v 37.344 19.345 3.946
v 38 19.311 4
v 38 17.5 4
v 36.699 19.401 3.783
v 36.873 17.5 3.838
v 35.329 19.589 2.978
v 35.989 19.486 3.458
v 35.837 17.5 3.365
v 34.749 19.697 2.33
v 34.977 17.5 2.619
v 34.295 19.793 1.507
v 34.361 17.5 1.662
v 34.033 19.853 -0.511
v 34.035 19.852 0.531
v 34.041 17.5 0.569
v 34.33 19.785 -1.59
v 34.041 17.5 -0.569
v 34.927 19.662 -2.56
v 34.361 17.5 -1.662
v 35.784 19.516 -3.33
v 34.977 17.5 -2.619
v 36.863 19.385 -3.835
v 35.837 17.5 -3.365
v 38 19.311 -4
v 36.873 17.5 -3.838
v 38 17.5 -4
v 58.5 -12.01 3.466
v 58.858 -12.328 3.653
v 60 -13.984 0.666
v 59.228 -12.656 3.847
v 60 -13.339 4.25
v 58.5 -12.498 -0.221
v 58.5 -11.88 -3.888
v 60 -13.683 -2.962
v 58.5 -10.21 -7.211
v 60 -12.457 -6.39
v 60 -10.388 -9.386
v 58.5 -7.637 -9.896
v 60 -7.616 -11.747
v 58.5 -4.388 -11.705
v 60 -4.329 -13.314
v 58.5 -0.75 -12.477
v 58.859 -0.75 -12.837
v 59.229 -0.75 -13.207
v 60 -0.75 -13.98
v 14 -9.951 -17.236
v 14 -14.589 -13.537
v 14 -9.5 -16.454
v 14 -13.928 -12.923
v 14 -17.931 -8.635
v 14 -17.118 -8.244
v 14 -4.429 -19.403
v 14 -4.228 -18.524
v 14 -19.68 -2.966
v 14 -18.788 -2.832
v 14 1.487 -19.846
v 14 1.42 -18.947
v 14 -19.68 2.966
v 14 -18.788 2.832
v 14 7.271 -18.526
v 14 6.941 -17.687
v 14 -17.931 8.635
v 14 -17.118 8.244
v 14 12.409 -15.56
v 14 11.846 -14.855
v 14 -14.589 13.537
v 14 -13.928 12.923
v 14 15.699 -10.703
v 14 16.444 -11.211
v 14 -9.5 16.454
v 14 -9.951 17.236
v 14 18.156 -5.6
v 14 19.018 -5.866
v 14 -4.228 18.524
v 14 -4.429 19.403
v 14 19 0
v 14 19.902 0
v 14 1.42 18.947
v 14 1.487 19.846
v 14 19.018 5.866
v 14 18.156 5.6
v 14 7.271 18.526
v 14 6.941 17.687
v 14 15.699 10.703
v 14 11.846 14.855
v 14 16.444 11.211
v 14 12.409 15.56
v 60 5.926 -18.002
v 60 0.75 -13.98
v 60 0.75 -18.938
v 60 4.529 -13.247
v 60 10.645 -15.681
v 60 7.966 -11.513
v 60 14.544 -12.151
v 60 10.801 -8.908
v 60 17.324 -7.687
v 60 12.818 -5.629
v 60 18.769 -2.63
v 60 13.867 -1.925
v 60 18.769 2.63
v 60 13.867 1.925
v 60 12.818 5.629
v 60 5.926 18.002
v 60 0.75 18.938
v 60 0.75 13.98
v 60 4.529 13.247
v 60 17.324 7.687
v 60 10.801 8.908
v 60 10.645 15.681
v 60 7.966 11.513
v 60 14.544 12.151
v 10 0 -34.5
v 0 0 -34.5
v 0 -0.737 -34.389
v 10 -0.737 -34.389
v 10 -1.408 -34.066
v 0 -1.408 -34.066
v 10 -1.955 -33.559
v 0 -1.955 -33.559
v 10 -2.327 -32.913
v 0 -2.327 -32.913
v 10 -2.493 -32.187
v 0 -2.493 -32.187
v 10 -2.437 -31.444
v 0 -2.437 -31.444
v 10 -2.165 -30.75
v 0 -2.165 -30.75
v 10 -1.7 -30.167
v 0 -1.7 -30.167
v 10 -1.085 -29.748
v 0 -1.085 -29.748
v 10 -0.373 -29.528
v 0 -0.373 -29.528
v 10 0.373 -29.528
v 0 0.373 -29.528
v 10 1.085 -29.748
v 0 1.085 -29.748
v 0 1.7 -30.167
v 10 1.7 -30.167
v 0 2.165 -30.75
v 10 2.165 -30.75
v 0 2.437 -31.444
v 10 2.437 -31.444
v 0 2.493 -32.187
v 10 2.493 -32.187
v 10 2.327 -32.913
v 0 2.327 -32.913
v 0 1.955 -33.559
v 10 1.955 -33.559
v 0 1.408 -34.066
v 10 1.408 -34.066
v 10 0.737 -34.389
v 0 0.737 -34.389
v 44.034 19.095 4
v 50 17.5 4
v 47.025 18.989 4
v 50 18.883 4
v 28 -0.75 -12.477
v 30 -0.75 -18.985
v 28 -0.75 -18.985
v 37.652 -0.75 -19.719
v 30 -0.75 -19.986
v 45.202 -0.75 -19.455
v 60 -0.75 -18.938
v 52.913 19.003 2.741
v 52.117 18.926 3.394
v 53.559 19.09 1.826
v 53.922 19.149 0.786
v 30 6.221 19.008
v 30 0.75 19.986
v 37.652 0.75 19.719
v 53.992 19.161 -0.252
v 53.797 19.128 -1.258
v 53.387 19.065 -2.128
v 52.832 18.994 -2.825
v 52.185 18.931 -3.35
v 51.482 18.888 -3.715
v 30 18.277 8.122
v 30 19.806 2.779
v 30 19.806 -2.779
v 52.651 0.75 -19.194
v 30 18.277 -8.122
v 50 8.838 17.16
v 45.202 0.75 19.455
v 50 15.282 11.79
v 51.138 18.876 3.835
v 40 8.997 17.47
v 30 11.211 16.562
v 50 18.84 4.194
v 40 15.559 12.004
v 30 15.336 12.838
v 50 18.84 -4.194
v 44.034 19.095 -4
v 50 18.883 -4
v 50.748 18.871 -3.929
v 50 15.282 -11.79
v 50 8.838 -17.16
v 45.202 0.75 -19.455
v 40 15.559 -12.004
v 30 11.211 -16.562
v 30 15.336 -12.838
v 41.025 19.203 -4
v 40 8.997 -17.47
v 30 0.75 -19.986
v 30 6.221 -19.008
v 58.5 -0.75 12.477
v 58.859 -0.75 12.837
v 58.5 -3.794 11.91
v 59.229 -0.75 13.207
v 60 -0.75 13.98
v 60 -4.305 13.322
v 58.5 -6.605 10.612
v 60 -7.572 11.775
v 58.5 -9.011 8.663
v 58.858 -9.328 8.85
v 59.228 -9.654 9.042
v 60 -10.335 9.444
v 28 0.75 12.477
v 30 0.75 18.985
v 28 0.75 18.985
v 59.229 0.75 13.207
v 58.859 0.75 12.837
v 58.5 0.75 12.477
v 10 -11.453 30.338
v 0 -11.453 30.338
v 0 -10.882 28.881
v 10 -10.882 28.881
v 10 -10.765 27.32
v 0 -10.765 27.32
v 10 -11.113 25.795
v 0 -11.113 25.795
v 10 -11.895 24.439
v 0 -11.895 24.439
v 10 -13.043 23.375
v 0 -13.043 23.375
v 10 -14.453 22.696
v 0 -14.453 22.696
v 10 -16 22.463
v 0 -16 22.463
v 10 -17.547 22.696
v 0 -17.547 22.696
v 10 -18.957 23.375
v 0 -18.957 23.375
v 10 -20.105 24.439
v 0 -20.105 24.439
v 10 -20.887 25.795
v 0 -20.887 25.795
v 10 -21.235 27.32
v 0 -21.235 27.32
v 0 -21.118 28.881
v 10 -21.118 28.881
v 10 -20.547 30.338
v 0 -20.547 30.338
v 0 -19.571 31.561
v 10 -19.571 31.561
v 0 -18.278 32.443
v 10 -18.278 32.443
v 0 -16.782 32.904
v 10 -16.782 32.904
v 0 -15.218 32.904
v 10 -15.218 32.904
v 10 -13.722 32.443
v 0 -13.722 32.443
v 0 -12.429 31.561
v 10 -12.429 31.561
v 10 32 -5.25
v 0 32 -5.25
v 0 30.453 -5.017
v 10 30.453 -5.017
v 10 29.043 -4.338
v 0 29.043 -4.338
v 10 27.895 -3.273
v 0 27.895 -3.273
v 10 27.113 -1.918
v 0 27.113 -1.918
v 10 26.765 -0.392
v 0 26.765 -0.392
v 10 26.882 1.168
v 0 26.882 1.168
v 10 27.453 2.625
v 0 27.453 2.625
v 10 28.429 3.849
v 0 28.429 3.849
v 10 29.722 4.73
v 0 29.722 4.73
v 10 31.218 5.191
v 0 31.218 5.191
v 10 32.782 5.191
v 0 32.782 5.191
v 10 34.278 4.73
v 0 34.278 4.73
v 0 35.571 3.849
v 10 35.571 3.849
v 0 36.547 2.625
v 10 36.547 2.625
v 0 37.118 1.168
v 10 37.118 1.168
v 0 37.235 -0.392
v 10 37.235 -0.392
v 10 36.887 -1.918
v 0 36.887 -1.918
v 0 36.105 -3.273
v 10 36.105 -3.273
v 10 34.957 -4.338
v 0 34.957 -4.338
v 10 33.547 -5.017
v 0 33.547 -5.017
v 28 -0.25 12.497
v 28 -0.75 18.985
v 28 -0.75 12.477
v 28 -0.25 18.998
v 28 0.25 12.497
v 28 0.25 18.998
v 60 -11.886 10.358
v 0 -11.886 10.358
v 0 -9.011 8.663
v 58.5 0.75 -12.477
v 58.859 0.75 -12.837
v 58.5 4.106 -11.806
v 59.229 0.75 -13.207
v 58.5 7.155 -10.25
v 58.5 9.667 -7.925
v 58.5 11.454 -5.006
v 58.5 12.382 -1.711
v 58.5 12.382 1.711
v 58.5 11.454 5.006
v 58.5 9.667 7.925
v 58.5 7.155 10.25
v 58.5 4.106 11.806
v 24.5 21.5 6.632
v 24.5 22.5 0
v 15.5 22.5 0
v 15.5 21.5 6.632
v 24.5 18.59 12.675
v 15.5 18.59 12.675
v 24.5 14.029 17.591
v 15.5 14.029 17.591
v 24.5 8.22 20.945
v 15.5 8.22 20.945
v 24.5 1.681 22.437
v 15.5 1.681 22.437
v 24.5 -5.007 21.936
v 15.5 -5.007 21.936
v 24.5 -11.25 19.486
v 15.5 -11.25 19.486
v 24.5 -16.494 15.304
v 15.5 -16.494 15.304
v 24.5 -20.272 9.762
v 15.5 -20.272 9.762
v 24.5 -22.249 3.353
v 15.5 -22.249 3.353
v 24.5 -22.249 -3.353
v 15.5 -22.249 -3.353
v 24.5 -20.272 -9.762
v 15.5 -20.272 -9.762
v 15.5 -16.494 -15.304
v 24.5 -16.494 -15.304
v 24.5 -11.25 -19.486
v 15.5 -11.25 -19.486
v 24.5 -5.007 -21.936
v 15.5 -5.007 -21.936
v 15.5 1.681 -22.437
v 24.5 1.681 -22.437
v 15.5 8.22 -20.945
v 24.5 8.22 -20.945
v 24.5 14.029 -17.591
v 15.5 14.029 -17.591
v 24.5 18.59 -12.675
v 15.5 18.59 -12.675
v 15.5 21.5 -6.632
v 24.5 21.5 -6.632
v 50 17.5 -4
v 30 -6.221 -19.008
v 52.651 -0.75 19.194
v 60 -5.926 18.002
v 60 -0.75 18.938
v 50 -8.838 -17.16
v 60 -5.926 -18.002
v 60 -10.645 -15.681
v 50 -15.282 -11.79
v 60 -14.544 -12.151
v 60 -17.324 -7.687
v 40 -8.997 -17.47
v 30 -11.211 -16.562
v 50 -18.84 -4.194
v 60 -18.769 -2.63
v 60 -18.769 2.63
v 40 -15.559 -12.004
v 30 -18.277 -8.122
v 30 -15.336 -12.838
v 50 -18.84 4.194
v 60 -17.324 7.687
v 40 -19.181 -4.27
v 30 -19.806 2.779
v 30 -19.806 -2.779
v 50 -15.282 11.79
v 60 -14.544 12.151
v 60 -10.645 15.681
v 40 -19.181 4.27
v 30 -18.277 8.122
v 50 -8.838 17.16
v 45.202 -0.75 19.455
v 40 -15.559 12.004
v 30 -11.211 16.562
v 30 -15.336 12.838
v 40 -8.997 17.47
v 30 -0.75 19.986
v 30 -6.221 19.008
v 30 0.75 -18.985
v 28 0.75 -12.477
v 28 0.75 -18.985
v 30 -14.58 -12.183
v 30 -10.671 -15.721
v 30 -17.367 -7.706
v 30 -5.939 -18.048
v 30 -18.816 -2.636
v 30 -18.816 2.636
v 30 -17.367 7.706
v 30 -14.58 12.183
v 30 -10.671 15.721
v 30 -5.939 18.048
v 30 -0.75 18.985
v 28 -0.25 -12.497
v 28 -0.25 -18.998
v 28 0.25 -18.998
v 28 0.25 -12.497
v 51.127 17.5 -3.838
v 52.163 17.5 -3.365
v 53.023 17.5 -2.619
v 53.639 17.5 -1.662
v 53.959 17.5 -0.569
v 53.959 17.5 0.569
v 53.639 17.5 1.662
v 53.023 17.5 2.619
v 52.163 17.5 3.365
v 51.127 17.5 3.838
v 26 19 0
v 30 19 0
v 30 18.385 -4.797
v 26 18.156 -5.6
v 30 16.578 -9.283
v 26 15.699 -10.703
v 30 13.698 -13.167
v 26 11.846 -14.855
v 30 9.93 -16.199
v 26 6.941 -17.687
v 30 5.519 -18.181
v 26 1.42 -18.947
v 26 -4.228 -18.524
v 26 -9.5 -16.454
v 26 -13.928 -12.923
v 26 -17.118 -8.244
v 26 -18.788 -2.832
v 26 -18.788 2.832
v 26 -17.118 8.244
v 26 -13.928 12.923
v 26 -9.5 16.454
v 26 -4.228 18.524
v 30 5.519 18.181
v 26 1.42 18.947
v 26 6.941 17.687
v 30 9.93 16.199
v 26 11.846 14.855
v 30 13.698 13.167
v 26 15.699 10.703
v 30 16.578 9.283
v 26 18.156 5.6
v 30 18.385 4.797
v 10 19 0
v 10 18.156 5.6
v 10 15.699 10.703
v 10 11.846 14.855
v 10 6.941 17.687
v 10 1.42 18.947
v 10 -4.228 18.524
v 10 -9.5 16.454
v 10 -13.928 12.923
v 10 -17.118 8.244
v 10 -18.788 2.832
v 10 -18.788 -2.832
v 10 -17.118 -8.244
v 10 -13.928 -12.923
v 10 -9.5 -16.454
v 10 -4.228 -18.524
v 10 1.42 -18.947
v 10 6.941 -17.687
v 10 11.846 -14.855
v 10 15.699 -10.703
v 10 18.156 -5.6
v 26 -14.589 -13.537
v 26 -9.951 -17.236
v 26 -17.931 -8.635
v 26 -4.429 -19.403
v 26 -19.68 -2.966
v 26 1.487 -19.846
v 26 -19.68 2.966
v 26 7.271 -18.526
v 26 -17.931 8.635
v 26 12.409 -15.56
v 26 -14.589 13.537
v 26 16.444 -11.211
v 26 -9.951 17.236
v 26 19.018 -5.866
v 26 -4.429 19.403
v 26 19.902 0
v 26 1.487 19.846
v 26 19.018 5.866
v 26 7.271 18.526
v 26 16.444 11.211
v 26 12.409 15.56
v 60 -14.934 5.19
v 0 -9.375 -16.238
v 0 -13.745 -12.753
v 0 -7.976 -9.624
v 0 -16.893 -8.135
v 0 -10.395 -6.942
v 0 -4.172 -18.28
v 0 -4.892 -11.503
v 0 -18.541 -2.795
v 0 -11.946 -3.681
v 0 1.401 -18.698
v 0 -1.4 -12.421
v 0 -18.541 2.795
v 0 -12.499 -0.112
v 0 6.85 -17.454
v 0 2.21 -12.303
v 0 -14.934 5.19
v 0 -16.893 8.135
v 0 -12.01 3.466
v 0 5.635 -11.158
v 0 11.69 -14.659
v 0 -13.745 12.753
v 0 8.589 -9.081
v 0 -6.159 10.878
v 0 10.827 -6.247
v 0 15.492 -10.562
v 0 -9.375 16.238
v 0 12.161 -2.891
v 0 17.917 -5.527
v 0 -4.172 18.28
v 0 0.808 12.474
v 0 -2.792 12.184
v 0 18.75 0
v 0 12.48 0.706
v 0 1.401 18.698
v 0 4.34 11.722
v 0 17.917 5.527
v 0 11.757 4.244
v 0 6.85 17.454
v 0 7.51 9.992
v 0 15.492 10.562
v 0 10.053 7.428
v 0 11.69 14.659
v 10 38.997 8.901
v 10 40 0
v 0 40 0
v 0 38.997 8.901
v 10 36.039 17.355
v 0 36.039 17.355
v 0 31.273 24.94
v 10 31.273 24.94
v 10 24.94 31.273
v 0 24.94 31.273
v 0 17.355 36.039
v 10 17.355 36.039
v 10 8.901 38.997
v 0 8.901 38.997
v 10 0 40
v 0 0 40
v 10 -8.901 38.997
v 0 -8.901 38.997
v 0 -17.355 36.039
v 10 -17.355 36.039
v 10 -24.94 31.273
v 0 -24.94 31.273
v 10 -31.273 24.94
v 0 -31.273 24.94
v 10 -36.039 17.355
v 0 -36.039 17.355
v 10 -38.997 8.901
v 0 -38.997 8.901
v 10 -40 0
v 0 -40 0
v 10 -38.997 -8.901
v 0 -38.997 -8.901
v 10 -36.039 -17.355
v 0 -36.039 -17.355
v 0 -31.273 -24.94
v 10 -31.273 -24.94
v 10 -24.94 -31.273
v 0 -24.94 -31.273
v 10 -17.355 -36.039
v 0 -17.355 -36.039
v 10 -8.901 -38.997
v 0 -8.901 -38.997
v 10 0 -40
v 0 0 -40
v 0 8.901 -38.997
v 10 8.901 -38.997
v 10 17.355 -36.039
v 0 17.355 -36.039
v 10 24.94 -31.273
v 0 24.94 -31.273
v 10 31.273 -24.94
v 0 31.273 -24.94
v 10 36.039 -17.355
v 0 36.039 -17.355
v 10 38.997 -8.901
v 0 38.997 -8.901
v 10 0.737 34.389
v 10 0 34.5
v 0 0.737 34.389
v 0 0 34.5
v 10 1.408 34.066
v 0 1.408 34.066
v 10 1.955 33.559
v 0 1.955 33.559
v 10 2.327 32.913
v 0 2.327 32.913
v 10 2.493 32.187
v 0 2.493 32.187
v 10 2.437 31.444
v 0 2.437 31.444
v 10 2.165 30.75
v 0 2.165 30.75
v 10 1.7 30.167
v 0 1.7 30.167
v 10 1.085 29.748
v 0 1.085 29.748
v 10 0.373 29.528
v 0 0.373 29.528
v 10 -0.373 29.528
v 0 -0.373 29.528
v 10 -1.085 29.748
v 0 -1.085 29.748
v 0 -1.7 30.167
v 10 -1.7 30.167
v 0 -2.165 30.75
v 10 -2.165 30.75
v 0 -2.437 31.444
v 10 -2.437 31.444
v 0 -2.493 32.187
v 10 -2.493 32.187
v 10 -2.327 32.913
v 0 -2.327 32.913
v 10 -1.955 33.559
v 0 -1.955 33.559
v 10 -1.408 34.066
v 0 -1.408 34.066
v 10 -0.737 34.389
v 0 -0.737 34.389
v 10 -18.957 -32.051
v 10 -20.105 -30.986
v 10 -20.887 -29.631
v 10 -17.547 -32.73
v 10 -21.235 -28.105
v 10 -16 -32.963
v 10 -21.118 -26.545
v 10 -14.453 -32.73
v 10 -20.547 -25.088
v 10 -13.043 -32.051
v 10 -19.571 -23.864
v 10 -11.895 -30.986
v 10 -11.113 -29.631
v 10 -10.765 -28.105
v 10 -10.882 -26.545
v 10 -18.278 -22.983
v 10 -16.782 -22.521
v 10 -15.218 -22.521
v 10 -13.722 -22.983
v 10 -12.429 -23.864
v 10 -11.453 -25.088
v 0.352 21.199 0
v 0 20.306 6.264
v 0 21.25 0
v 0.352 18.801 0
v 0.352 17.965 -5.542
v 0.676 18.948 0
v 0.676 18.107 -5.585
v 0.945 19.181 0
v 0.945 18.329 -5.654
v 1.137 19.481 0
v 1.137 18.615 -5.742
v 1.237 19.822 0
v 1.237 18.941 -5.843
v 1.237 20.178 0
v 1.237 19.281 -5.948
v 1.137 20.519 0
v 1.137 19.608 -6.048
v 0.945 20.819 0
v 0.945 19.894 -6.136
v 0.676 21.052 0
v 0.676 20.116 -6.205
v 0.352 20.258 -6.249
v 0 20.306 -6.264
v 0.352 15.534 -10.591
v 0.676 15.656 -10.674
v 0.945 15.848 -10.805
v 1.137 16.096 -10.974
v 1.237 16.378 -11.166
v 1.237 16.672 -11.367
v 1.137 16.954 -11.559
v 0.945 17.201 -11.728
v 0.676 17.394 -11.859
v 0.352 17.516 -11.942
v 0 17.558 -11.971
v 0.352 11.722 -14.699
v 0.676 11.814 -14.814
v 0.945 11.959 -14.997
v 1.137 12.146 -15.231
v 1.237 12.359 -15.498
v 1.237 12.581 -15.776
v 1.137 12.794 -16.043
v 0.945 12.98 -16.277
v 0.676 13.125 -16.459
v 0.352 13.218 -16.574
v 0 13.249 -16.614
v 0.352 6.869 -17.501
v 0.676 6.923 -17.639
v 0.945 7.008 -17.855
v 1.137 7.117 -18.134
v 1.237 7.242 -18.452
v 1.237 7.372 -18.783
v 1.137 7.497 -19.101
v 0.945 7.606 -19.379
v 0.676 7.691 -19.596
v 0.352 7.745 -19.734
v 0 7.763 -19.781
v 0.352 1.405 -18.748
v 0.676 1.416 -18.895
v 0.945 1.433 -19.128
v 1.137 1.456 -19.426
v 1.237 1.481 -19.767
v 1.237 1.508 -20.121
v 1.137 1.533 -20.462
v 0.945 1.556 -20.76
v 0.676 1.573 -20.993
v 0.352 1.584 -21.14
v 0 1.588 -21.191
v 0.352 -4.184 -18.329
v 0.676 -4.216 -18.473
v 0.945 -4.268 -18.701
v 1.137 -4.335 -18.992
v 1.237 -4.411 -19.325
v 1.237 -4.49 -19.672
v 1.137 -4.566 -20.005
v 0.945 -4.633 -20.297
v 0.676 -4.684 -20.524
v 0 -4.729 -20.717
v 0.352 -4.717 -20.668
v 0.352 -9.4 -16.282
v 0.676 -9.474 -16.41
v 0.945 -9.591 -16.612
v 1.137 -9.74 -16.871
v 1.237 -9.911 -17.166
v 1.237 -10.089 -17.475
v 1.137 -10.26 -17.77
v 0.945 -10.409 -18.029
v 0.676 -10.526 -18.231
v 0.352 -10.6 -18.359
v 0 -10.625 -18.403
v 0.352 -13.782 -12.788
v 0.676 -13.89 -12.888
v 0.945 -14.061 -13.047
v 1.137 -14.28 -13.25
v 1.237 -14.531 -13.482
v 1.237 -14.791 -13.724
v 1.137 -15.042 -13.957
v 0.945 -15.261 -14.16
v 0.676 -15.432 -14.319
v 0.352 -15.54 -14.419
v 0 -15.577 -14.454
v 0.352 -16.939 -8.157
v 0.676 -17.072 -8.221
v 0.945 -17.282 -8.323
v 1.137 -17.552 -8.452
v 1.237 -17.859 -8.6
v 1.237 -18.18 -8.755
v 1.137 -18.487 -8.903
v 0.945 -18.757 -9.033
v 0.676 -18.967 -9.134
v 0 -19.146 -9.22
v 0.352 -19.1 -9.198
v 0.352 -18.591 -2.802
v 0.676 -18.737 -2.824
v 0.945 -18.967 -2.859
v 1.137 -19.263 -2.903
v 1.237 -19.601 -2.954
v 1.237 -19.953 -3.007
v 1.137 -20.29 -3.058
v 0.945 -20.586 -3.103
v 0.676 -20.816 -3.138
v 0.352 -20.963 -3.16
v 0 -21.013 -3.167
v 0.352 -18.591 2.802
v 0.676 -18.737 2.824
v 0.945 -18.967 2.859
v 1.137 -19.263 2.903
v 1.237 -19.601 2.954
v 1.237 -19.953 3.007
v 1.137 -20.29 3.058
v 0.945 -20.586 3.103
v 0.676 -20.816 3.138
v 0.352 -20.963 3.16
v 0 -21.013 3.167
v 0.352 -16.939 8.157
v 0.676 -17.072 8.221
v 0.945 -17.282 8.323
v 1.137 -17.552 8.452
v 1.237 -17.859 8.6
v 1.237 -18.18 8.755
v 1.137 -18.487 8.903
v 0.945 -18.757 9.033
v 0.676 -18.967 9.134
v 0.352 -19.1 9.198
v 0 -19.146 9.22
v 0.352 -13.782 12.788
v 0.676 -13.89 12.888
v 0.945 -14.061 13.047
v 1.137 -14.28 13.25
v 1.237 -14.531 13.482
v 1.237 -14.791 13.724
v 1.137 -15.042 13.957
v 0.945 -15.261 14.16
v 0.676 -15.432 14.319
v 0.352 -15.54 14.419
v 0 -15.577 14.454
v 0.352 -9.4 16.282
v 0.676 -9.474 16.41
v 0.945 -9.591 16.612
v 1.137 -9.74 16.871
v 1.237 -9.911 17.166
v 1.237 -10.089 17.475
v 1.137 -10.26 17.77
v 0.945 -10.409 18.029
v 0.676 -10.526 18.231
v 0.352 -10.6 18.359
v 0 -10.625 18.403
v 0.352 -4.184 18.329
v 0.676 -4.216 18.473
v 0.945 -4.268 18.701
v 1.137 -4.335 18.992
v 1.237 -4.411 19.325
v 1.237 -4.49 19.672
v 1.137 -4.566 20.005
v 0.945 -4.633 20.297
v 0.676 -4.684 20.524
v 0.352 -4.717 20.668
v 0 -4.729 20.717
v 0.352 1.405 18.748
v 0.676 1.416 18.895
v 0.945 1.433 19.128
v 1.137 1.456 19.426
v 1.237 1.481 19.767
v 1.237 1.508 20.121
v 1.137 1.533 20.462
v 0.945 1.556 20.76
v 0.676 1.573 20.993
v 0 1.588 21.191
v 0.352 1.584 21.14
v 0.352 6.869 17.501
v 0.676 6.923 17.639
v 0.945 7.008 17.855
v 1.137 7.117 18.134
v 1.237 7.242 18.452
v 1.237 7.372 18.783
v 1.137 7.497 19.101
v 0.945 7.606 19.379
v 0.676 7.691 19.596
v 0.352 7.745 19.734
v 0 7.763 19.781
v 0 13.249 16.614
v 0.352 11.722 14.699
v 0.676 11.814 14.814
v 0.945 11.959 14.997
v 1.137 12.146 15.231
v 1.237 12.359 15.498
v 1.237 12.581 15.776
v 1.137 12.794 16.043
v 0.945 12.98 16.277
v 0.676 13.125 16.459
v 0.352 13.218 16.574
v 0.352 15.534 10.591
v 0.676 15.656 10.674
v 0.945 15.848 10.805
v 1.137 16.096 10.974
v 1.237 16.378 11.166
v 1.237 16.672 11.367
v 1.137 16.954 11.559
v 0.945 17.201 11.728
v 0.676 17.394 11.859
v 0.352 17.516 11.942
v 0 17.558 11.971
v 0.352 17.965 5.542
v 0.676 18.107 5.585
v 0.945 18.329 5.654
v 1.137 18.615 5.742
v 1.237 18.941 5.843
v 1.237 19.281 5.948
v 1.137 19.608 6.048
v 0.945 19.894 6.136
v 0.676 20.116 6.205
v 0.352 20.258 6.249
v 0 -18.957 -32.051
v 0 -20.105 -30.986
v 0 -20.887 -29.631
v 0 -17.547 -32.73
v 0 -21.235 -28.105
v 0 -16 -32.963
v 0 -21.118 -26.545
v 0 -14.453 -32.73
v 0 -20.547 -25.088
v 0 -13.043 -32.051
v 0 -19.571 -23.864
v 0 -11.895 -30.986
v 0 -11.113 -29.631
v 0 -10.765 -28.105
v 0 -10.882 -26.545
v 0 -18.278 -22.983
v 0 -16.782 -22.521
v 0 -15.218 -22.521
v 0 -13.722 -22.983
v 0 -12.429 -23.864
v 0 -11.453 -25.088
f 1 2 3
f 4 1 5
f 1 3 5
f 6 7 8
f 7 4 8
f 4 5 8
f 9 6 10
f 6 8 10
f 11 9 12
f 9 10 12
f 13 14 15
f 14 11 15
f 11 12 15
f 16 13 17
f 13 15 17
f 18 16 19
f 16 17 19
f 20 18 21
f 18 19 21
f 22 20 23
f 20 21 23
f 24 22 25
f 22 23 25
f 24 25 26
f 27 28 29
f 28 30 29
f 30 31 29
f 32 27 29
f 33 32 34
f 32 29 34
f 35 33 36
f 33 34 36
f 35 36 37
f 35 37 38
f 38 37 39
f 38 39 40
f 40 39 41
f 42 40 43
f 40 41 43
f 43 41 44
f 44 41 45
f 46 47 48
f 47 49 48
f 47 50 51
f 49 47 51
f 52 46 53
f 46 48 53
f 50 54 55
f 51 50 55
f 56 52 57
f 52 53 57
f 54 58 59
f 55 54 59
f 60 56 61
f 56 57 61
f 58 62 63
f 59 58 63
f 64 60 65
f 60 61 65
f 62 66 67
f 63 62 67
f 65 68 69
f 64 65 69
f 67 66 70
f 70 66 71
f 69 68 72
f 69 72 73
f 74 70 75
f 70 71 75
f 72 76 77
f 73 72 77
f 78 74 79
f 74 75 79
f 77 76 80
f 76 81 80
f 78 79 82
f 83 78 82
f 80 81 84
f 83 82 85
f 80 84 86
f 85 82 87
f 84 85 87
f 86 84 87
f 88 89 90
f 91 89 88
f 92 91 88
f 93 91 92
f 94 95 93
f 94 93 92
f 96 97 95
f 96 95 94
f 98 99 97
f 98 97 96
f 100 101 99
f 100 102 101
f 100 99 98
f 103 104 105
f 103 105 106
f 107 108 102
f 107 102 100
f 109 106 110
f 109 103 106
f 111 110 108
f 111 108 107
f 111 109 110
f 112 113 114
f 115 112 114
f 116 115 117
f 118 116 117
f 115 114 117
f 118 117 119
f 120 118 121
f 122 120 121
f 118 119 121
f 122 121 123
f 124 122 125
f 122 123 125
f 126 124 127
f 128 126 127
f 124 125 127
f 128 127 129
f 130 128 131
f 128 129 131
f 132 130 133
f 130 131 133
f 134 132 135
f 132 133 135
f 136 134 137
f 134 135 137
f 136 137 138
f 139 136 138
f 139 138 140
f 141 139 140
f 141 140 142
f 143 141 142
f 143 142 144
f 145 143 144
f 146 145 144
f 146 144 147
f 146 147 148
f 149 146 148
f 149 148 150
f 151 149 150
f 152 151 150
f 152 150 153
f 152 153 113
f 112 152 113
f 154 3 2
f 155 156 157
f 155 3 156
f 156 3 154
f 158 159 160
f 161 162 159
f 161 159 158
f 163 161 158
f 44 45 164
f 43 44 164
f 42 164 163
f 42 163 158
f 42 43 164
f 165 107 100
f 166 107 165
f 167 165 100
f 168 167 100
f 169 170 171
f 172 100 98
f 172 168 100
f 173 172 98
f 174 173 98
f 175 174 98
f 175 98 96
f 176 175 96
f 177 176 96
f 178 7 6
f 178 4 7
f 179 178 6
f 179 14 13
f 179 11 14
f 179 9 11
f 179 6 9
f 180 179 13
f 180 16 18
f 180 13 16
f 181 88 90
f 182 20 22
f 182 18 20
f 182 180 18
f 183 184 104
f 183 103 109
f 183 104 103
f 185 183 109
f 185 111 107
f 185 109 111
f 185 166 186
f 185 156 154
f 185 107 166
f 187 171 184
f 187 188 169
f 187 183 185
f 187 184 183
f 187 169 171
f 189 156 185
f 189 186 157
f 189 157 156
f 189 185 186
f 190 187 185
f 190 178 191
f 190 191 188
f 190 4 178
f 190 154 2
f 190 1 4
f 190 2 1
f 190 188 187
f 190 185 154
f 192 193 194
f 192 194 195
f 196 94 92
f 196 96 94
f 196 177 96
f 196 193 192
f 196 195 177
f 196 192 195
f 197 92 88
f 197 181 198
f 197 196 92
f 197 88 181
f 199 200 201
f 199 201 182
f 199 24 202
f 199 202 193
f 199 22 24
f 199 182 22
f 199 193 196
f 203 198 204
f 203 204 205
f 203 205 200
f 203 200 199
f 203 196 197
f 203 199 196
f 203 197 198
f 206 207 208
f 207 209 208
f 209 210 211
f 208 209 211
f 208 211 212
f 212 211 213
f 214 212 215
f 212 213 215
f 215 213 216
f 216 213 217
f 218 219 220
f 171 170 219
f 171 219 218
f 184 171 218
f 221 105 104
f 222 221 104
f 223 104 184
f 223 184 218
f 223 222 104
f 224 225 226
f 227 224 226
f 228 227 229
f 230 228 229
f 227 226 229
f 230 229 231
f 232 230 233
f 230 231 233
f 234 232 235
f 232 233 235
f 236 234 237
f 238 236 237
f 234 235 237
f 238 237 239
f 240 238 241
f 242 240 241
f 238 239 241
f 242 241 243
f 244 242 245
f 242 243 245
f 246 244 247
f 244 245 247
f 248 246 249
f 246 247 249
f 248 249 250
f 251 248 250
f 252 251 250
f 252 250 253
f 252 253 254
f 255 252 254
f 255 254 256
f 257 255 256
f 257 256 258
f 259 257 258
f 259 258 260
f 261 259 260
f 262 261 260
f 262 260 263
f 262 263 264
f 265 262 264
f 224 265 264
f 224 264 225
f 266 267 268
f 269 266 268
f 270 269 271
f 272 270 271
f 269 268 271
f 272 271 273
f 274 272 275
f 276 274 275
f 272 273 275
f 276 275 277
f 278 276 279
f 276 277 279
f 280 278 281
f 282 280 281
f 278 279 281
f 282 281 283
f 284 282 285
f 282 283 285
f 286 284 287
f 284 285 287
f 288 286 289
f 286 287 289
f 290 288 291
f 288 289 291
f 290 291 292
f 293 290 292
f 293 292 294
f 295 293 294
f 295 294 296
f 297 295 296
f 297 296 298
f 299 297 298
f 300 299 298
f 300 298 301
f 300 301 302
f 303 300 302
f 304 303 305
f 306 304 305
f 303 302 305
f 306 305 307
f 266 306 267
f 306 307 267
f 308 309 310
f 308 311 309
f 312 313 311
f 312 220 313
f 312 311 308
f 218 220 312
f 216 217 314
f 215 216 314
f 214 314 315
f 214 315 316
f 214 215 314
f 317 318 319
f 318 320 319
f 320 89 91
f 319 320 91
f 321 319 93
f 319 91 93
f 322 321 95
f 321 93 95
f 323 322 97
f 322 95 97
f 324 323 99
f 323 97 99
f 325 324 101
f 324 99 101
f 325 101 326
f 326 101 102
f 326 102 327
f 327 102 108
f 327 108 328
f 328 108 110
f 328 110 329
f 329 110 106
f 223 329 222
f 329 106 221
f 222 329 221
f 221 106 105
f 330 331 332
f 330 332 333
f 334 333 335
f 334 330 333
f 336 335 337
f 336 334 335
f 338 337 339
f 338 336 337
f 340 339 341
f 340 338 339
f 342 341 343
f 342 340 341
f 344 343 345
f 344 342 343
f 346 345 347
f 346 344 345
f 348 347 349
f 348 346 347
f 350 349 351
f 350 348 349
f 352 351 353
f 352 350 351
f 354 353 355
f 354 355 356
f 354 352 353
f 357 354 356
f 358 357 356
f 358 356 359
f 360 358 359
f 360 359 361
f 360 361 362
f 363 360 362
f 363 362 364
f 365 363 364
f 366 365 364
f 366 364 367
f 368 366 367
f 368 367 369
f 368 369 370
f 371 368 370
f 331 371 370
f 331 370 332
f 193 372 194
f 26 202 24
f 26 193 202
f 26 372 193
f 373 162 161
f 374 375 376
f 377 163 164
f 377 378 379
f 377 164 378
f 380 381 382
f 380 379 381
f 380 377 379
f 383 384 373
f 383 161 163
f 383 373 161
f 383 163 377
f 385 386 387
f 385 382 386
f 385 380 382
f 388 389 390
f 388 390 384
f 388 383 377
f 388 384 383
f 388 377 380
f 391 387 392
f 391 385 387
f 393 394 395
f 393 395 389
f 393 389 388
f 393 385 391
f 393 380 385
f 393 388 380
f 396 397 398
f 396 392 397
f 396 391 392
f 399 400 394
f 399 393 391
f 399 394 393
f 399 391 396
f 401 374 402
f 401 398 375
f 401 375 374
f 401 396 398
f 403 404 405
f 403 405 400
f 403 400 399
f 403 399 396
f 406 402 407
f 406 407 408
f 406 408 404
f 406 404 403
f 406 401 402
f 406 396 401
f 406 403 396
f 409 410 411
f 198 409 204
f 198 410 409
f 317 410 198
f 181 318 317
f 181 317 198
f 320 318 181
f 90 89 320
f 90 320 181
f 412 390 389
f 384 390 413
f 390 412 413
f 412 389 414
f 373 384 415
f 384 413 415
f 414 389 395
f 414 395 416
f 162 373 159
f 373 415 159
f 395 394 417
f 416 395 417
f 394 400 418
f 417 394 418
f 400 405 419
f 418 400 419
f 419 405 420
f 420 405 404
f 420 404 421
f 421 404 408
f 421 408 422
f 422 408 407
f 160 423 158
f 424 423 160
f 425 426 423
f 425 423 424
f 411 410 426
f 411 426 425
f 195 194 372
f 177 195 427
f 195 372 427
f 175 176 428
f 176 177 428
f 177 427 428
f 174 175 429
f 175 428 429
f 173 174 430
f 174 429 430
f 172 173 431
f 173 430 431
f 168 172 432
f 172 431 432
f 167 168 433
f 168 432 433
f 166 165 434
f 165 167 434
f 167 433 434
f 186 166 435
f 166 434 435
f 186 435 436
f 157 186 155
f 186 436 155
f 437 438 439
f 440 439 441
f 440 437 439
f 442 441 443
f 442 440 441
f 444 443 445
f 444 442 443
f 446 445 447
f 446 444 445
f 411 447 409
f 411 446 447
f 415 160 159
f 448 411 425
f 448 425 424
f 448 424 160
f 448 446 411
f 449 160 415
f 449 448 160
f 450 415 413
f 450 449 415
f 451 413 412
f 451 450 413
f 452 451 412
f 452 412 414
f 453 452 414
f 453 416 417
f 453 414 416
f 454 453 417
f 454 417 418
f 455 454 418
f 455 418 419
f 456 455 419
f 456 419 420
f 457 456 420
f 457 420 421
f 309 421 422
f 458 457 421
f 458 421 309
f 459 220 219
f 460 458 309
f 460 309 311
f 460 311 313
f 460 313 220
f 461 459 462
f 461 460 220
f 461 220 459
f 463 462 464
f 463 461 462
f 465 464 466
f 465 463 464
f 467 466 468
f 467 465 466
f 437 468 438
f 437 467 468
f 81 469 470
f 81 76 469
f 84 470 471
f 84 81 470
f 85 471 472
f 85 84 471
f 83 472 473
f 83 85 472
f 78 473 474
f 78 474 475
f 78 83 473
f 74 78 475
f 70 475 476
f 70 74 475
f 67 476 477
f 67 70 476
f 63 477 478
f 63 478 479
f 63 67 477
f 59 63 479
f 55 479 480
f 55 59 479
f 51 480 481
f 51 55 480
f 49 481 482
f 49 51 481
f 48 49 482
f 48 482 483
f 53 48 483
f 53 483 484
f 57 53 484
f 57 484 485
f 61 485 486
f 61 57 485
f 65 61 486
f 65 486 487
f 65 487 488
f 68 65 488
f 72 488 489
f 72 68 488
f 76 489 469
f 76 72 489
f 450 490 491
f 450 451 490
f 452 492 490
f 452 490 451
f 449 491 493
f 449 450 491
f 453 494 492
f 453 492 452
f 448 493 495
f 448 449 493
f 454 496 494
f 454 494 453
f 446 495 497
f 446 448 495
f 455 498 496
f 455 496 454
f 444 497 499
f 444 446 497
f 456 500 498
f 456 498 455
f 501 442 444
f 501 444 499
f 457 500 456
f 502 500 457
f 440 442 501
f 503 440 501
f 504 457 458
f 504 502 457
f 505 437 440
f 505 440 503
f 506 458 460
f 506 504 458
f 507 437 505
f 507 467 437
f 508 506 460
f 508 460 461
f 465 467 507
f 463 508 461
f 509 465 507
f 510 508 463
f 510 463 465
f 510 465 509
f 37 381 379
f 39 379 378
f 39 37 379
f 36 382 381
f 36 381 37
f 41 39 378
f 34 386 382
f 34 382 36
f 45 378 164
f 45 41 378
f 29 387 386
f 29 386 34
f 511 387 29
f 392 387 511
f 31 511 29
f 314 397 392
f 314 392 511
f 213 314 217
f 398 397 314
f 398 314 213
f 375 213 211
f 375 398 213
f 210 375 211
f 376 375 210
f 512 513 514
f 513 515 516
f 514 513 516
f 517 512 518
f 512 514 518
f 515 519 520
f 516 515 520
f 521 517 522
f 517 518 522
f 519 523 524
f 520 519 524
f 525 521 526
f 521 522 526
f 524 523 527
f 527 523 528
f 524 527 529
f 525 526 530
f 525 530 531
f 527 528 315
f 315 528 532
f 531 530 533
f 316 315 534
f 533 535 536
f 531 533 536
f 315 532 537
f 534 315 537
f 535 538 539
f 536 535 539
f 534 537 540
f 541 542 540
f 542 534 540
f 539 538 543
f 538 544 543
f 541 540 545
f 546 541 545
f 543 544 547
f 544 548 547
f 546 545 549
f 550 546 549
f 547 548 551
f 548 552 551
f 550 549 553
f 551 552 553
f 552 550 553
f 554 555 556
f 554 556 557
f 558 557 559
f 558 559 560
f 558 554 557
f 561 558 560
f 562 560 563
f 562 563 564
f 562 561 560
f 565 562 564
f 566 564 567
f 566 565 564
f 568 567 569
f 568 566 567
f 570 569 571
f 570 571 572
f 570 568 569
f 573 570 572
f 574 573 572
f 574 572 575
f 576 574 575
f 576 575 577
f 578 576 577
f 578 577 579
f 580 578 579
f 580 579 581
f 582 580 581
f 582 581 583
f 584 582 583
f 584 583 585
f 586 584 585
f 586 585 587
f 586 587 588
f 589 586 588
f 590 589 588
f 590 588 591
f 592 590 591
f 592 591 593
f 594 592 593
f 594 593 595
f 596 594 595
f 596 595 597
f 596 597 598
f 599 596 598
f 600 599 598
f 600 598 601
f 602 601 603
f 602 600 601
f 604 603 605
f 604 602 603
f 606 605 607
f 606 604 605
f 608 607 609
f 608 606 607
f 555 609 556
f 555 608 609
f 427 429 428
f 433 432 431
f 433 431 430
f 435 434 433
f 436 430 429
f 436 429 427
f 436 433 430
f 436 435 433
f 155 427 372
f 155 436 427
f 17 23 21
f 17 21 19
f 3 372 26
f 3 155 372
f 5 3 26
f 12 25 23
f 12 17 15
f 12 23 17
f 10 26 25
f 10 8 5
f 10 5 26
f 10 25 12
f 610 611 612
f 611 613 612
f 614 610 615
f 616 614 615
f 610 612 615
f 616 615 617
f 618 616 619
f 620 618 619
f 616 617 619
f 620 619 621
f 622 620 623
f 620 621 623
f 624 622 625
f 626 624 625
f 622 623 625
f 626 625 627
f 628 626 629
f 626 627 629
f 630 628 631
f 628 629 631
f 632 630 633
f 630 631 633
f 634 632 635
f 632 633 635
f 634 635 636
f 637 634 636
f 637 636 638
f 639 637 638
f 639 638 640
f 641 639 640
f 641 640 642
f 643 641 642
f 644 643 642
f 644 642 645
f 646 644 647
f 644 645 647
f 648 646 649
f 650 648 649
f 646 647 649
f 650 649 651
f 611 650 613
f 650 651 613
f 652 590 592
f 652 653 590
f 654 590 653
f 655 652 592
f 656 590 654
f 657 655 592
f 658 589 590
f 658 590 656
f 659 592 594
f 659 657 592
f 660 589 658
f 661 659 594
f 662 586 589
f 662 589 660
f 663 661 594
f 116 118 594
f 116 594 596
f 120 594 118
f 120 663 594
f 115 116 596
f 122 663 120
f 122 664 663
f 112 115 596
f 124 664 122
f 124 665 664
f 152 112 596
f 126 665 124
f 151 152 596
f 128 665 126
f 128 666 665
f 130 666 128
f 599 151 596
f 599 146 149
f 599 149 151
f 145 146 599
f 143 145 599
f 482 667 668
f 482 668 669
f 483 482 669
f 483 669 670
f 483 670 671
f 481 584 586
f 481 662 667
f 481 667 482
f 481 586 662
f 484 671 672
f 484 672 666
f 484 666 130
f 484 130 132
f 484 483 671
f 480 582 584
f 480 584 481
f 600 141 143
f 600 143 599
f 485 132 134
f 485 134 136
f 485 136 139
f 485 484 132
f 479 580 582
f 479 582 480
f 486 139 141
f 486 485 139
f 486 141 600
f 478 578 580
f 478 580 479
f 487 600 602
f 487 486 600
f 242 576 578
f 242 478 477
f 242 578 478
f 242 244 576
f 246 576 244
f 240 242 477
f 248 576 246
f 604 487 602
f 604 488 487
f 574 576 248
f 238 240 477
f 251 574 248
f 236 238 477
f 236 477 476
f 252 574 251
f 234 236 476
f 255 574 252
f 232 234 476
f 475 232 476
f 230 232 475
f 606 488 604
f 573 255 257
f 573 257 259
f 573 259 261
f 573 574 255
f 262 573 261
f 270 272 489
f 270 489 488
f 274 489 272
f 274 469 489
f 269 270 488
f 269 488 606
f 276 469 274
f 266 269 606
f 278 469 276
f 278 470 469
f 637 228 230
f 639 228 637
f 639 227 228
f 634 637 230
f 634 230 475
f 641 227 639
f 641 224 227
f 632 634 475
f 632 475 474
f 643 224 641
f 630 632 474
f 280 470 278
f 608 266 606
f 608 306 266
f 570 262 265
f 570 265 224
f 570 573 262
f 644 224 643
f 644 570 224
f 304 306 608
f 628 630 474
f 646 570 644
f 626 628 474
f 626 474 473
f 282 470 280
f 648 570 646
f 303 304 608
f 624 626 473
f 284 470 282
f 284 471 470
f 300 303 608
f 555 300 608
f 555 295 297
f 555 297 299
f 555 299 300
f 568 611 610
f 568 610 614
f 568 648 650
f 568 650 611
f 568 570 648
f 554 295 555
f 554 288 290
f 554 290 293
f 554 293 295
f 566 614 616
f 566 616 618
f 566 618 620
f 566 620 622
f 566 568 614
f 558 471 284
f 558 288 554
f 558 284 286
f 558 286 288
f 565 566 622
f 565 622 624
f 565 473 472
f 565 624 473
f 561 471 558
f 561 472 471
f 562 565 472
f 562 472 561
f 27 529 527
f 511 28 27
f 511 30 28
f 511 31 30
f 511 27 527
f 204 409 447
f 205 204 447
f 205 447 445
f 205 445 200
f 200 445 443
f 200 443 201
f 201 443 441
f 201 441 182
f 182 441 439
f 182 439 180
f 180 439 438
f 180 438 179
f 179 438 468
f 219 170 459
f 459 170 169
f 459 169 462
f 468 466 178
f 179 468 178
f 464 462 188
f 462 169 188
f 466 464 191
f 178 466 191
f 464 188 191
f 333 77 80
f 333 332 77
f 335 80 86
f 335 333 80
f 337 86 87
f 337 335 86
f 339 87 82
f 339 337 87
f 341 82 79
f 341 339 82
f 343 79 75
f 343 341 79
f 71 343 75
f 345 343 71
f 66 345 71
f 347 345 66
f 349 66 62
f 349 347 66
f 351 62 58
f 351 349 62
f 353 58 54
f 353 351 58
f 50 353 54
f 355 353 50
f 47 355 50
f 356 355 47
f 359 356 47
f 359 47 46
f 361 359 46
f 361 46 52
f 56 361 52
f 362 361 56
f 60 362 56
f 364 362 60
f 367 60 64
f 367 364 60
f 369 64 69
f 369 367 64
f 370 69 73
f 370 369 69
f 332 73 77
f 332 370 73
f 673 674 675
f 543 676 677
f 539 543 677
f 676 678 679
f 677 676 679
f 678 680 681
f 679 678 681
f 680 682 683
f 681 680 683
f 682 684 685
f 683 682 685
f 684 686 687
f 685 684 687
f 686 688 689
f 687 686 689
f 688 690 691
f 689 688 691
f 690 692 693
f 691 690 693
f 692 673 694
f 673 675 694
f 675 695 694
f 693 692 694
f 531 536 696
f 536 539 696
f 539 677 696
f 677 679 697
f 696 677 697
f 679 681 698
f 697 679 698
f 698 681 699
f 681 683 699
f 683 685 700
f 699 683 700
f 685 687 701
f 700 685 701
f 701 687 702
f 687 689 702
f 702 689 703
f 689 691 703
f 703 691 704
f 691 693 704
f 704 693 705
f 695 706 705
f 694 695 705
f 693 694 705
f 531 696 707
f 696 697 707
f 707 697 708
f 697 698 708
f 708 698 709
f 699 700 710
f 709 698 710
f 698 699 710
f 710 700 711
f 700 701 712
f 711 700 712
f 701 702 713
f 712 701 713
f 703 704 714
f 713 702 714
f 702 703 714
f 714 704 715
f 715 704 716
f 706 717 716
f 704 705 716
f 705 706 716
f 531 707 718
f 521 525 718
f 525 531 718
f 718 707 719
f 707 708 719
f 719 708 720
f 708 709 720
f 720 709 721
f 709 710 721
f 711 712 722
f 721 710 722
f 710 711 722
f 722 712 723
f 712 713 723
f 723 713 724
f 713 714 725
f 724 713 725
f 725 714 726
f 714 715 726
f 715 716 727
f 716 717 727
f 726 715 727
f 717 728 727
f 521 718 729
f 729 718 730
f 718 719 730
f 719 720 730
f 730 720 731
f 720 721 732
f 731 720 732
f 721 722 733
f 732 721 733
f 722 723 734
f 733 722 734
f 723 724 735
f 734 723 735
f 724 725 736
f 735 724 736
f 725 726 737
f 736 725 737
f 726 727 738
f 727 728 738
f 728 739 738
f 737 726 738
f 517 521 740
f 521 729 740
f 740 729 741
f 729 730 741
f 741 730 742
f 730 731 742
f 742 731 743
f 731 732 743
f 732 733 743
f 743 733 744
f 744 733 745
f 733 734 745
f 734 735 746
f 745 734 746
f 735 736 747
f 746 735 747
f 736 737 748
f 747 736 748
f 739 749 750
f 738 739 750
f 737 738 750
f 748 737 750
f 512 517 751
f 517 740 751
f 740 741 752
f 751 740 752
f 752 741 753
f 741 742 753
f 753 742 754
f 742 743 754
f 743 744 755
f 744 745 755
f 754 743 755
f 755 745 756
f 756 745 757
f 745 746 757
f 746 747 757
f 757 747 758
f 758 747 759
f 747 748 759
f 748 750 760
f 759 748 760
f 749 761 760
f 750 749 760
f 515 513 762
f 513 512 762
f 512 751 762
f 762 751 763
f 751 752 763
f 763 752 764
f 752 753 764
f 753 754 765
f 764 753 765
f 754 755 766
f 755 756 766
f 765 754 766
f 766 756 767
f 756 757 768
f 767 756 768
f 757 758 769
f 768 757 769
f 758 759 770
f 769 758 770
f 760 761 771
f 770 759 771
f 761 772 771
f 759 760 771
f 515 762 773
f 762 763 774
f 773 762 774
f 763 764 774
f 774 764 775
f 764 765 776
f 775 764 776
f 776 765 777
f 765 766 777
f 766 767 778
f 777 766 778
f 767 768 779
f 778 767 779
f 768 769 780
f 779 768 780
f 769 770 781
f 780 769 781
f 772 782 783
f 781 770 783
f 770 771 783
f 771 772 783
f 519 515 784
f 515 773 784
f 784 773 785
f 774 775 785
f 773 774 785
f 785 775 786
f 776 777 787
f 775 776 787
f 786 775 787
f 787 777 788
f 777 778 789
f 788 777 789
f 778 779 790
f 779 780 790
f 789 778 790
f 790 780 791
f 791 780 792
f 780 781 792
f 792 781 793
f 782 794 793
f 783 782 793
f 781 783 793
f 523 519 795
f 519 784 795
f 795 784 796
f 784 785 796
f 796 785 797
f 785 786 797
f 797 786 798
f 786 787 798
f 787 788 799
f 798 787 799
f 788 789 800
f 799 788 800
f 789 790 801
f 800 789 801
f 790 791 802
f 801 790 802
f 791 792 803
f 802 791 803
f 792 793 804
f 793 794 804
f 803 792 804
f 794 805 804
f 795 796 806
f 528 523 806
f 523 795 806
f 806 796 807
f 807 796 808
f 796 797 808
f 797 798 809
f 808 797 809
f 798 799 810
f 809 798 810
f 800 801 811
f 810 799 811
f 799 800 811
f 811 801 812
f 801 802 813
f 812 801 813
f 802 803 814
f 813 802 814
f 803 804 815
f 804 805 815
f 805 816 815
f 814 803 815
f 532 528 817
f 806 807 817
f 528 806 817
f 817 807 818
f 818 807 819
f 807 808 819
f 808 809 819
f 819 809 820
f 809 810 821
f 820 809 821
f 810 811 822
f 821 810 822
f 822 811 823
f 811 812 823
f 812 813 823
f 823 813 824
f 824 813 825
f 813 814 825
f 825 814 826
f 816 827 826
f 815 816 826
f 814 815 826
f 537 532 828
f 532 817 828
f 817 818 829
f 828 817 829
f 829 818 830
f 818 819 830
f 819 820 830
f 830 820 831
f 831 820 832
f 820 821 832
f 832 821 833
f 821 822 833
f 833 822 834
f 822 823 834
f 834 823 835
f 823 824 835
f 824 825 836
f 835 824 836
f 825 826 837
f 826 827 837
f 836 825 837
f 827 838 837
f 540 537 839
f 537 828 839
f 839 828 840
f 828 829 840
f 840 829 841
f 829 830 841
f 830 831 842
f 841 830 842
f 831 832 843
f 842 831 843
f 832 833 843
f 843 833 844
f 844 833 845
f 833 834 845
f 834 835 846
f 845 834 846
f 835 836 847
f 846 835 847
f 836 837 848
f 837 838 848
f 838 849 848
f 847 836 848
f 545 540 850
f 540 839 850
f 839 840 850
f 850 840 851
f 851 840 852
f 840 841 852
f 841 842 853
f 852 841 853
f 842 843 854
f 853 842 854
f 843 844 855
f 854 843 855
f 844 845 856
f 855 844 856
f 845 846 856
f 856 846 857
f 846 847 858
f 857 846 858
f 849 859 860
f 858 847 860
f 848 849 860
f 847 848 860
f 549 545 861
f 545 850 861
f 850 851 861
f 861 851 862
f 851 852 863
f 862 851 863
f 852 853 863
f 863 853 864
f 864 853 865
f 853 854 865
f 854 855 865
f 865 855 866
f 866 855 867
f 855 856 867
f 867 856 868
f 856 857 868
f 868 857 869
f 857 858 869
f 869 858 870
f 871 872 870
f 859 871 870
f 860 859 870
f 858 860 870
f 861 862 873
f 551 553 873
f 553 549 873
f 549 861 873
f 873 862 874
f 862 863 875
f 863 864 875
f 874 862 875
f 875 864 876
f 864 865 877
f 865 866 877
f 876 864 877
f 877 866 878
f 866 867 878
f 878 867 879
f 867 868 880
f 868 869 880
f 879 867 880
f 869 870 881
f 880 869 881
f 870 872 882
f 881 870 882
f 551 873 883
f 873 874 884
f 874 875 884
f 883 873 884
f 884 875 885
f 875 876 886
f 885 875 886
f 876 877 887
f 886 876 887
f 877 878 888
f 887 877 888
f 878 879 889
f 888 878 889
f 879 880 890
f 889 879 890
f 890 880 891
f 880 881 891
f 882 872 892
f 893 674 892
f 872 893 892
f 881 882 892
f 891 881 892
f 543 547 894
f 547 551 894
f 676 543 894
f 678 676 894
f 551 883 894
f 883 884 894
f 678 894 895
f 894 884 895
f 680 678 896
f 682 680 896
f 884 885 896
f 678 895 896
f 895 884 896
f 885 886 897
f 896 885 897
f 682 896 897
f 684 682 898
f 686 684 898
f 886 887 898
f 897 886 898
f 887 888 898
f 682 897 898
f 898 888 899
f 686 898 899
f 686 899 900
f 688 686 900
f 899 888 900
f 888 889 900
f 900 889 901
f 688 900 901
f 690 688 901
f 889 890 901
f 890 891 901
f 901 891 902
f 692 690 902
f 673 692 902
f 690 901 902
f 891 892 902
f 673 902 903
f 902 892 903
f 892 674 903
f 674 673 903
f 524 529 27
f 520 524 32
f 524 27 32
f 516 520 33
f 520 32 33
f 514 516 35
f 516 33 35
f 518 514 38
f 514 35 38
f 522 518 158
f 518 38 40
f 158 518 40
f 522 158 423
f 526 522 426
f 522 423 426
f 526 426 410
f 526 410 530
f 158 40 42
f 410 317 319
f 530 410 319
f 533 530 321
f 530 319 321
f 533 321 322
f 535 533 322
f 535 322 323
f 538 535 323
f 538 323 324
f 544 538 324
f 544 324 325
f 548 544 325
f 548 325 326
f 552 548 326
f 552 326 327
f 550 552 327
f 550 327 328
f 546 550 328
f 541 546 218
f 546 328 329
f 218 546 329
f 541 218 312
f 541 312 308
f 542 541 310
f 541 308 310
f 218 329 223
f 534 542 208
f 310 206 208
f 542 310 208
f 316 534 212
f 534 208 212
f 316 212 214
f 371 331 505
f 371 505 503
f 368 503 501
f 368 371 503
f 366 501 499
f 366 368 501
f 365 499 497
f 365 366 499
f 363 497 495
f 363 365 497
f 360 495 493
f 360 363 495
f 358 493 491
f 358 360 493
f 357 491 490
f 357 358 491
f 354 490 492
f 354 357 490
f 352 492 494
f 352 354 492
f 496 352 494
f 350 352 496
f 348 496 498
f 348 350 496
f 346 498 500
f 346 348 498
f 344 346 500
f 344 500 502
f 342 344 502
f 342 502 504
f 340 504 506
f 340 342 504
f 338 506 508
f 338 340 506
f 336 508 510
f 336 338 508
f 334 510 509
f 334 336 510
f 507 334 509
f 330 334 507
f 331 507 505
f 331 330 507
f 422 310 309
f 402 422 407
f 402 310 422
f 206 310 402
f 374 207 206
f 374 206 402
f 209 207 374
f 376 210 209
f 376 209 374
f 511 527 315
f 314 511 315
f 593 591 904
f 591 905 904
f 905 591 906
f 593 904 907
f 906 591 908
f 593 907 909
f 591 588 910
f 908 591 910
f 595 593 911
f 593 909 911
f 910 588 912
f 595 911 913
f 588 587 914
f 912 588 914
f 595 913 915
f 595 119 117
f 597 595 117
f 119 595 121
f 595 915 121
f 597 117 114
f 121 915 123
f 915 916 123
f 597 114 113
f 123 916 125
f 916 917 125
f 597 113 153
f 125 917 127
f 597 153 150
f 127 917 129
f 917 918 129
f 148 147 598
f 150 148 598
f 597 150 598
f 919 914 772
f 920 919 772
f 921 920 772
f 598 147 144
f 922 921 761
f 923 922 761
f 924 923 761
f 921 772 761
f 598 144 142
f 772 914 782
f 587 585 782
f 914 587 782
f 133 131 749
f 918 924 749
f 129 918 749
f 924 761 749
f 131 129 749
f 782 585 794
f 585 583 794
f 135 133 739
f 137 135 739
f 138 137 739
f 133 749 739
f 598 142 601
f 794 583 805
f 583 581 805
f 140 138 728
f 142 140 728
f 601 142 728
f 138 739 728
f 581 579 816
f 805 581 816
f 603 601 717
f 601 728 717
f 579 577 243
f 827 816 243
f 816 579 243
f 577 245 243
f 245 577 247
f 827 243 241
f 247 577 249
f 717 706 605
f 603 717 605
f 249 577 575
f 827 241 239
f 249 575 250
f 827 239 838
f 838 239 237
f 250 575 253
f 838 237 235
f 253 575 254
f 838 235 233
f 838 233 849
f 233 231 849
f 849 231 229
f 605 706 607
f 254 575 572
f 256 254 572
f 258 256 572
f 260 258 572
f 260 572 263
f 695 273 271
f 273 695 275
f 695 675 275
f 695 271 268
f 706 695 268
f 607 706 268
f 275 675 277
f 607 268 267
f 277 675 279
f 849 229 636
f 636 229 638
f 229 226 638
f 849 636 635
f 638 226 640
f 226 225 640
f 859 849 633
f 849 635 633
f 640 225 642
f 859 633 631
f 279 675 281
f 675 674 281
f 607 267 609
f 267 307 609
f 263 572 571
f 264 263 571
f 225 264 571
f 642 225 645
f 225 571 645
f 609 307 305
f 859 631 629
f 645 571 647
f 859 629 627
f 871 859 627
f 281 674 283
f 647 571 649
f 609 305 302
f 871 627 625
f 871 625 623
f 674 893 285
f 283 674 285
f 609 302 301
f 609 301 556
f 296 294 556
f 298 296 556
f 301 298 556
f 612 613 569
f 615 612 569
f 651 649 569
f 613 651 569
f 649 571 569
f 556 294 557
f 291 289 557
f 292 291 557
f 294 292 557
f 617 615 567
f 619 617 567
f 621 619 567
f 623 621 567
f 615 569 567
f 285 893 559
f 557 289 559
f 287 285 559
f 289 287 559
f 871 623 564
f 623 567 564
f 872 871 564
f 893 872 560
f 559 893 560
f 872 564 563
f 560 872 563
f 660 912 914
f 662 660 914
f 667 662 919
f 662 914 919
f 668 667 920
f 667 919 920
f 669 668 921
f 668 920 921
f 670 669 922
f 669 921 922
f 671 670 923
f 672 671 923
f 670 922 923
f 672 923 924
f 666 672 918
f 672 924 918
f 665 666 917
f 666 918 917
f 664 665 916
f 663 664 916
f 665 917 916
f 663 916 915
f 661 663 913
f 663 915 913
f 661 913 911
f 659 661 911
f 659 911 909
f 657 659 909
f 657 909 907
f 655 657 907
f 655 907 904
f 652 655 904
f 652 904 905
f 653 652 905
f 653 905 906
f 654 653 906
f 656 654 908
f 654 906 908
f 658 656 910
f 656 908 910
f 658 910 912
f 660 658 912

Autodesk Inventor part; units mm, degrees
ref_plane "YZ Plane" through (0, 0, 0) normal (1, 0, 0) x (0, 1, 0)
ref_plane "XY Plane" through (0, 0, 0) normal (0, 0, 1) x (1, 0, 0)
sketch "Sketch1" plane through (0, 0, 0) normal (0, 0, 1) x (1, 0, 0)
  line L0 (0, 0) -> (60, 0)
  line L1 (0, 0) -> (0, 12.5) construction
  line L2 (0, 40) -> (10, 40)
  line L3 (10, 40) -> (10, 19)
  line L4 (10, 19) -> (14, 19)
  line L5 (0, 12.5) -> (60, 12.5)
  line L6 (60, 12.5) -> (60, 18.9524)
  line L7 (30, 20) -> (30, 19)
  line L8 (30, 19) -> (26, 19)
  line L9 (26, 19) -> (26, 19.9019)
  line L10 (14, 19.9019) -> (14, 19)
  line L11 (15.5, 22.5) -> (14, 19.9019)
  line L12 (15.5, 22.5) -> (24.5, 22.5)
  line L13 (24.5, 22.5) -> (26, 19.9019)
  line L14 (30, 20) -> (60, 18.9524)
  line L15 (30, 20) -> (60.0183, 20) construction
  arc A0 (0, 18.75) -> (0, 21.25) centre (0, 20) ccw
  line L16 (0, 12.5) -> (0, 18.75)
  line L17 (0, 21.25) -> (0, 40)
  dimension "d0" = 60
  dimension "d1" = 12.5
  dimension "d2" = 27.5
  dimension "d3" = 10
  dimension "d4" = 21
  dimension "d5" = 4
  dimension "d9" = 4
  dimension "d11" = 1
  dimension "d20" = 1.5
  dimension "d21" = 60
  dimension "d22" = 1.5
  dimension "d23" = 60
  dimension "d25" = 0.9019
  dimension "d26" = 0.9019
  dimension "d28" = 60
  dimension "d29" = 2
  dimension "d30" = 7.5
  dimension "d31" = 9
  dimension "d32" = 2.5
  dimension "d33" = 40
revolve "Revolution1" add sketch "Sketch1" angle 360 about axis through (0, 0, 0) along (1, 0, 0)
sketch "Sketch2" plane through (10, 0, 0) normal (1, 0, 0) x (0, 0, -1)
  point P0 (0, 0)
  point P1 (0, 32)
hole "Hole1" at (10, 32, 0) direction (-1, 0, 0) diameter 10.5 end through all
pattern_circular "Circular Pattern1" count 3 over 360 about axis through (30, 0, 0) along (1, 0, 0) of "Hole1"
sketch "Sketch3" plane through (10, 0, 0) normal (1, 0, 0) x (0, 0, -1)
  point P0 (0, 0)
  point P1 (0, 0)
  point P2 (32, 0)
hole "Hole2" at (10, 0, 0) at (10, 0, -32) direction (-1, 0, 0) diameter 5 end through all
pattern_circular "Circular Pattern2" count 2 over 360 about axis through (30, 0, 0) along (1, 0, 0) of "Hole2"
sketch "Sketch4" plane through (60, 0, 0) normal (1, 0, 0) x (0, 0, -1)
  line L0 (-62.0461, 0.75) -> (63.0717, 0.75)
  line L1 (63.0717, 0.75) -> (63.0717, -0.75)
  line L2 (63.0717, -0.75) -> (-62.0461, -0.75)
  line L3 (-62.0461, -0.75) -> (-62.0461, 0.75)
  point P0 (0, 0)
  dimension "d55" = 1.5
  dimension "d56" = 0.75
extrude "Extrusion1" cut sketch "Sketch4" against normal blind 32
sketch "Sketch5" plane through (60, 0, 0) normal (1, 0, 0) x (0, 0, -1)
  line L0 (0, 0) -> (-26.5, -45.8993)
  line L1 (0, 0) -> (53, 0) construction
  line L2 (-2.1416, -9.7648) -> (-5.1902, -14.9339)
  line L3 (-5.1902, -14.9339) -> (-10.3584, -11.8858)
  line L4 (-10.3584, -11.8858) -> (-7.3098, -6.7168)
  line L5 (-7.3098, -6.7168) -> (-2.1416, -9.7648)
  circle A0 centre (0, 0) radius 12.5 projected
  line L6 (-2.1416, -9.7648) -> (-10.3584, -11.8858) construction
  line L7 (-5.1902, -14.9339) -> (-7.3098, -6.7168) construction
  point P0 (-6.25, -10.8253)
  dimension "d59" = 53
  dimension "d60" = 120
  dimension "d61" = 6
  dimension "d62" = 15.5
extrude "Extrusion2" cut sketch "Sketch5" against normal through all contours L5 L2 A0 L0 | L0 A0 L4 L5 | A0 L2 L3 L0 | L0 L3 L4 A0
chamfer "Chamfer1" distance 1.5 angle 45 3 edges at (60, -5.24, 11.3487) (60, 12.5, 0) (60, -10.2103, -7.2111)
thread "Thread1" size "M45x1.5" class "6g" standard "ISO Metric profile" full length
ref_plane "Work Plane1" through (0, 17.5, 0) normal (0, 1, 0) x (-1, 0, 0)
sketch "Sketch6" plane through (0, 17.5, 0) normal (0, 1, 0) x (-1, 0, 0)
  line L0 (-38, 0) -> (-50, 0) construction
  line L1 (-38, 4) -> (-50, 4)
  line L2 (-50, -4) -> (-38, -4)
  arc A0 (-38, -4) -> (-38, 4) centre (-38, 0) ccw
  arc A1 (-50, 4) -> (-50, -4) centre (-50, 0) ccw
  point P0 (0, 0)
  point P1 (-44, 0)
  dimension "d71" = 8
  dimension "d72" = 38
  dimension "d73" = 50
extrude "Extrusion3" cut sketch "Sketch6" along normal blind 26.5
equation "\"d56\" = 0.5 * d55"
equation "\"d22\" = d20"
equation "\"d23\" = d21"
equation "\"d26\" = d25"
properties part number "Spannhylsa_2015_HT1"
